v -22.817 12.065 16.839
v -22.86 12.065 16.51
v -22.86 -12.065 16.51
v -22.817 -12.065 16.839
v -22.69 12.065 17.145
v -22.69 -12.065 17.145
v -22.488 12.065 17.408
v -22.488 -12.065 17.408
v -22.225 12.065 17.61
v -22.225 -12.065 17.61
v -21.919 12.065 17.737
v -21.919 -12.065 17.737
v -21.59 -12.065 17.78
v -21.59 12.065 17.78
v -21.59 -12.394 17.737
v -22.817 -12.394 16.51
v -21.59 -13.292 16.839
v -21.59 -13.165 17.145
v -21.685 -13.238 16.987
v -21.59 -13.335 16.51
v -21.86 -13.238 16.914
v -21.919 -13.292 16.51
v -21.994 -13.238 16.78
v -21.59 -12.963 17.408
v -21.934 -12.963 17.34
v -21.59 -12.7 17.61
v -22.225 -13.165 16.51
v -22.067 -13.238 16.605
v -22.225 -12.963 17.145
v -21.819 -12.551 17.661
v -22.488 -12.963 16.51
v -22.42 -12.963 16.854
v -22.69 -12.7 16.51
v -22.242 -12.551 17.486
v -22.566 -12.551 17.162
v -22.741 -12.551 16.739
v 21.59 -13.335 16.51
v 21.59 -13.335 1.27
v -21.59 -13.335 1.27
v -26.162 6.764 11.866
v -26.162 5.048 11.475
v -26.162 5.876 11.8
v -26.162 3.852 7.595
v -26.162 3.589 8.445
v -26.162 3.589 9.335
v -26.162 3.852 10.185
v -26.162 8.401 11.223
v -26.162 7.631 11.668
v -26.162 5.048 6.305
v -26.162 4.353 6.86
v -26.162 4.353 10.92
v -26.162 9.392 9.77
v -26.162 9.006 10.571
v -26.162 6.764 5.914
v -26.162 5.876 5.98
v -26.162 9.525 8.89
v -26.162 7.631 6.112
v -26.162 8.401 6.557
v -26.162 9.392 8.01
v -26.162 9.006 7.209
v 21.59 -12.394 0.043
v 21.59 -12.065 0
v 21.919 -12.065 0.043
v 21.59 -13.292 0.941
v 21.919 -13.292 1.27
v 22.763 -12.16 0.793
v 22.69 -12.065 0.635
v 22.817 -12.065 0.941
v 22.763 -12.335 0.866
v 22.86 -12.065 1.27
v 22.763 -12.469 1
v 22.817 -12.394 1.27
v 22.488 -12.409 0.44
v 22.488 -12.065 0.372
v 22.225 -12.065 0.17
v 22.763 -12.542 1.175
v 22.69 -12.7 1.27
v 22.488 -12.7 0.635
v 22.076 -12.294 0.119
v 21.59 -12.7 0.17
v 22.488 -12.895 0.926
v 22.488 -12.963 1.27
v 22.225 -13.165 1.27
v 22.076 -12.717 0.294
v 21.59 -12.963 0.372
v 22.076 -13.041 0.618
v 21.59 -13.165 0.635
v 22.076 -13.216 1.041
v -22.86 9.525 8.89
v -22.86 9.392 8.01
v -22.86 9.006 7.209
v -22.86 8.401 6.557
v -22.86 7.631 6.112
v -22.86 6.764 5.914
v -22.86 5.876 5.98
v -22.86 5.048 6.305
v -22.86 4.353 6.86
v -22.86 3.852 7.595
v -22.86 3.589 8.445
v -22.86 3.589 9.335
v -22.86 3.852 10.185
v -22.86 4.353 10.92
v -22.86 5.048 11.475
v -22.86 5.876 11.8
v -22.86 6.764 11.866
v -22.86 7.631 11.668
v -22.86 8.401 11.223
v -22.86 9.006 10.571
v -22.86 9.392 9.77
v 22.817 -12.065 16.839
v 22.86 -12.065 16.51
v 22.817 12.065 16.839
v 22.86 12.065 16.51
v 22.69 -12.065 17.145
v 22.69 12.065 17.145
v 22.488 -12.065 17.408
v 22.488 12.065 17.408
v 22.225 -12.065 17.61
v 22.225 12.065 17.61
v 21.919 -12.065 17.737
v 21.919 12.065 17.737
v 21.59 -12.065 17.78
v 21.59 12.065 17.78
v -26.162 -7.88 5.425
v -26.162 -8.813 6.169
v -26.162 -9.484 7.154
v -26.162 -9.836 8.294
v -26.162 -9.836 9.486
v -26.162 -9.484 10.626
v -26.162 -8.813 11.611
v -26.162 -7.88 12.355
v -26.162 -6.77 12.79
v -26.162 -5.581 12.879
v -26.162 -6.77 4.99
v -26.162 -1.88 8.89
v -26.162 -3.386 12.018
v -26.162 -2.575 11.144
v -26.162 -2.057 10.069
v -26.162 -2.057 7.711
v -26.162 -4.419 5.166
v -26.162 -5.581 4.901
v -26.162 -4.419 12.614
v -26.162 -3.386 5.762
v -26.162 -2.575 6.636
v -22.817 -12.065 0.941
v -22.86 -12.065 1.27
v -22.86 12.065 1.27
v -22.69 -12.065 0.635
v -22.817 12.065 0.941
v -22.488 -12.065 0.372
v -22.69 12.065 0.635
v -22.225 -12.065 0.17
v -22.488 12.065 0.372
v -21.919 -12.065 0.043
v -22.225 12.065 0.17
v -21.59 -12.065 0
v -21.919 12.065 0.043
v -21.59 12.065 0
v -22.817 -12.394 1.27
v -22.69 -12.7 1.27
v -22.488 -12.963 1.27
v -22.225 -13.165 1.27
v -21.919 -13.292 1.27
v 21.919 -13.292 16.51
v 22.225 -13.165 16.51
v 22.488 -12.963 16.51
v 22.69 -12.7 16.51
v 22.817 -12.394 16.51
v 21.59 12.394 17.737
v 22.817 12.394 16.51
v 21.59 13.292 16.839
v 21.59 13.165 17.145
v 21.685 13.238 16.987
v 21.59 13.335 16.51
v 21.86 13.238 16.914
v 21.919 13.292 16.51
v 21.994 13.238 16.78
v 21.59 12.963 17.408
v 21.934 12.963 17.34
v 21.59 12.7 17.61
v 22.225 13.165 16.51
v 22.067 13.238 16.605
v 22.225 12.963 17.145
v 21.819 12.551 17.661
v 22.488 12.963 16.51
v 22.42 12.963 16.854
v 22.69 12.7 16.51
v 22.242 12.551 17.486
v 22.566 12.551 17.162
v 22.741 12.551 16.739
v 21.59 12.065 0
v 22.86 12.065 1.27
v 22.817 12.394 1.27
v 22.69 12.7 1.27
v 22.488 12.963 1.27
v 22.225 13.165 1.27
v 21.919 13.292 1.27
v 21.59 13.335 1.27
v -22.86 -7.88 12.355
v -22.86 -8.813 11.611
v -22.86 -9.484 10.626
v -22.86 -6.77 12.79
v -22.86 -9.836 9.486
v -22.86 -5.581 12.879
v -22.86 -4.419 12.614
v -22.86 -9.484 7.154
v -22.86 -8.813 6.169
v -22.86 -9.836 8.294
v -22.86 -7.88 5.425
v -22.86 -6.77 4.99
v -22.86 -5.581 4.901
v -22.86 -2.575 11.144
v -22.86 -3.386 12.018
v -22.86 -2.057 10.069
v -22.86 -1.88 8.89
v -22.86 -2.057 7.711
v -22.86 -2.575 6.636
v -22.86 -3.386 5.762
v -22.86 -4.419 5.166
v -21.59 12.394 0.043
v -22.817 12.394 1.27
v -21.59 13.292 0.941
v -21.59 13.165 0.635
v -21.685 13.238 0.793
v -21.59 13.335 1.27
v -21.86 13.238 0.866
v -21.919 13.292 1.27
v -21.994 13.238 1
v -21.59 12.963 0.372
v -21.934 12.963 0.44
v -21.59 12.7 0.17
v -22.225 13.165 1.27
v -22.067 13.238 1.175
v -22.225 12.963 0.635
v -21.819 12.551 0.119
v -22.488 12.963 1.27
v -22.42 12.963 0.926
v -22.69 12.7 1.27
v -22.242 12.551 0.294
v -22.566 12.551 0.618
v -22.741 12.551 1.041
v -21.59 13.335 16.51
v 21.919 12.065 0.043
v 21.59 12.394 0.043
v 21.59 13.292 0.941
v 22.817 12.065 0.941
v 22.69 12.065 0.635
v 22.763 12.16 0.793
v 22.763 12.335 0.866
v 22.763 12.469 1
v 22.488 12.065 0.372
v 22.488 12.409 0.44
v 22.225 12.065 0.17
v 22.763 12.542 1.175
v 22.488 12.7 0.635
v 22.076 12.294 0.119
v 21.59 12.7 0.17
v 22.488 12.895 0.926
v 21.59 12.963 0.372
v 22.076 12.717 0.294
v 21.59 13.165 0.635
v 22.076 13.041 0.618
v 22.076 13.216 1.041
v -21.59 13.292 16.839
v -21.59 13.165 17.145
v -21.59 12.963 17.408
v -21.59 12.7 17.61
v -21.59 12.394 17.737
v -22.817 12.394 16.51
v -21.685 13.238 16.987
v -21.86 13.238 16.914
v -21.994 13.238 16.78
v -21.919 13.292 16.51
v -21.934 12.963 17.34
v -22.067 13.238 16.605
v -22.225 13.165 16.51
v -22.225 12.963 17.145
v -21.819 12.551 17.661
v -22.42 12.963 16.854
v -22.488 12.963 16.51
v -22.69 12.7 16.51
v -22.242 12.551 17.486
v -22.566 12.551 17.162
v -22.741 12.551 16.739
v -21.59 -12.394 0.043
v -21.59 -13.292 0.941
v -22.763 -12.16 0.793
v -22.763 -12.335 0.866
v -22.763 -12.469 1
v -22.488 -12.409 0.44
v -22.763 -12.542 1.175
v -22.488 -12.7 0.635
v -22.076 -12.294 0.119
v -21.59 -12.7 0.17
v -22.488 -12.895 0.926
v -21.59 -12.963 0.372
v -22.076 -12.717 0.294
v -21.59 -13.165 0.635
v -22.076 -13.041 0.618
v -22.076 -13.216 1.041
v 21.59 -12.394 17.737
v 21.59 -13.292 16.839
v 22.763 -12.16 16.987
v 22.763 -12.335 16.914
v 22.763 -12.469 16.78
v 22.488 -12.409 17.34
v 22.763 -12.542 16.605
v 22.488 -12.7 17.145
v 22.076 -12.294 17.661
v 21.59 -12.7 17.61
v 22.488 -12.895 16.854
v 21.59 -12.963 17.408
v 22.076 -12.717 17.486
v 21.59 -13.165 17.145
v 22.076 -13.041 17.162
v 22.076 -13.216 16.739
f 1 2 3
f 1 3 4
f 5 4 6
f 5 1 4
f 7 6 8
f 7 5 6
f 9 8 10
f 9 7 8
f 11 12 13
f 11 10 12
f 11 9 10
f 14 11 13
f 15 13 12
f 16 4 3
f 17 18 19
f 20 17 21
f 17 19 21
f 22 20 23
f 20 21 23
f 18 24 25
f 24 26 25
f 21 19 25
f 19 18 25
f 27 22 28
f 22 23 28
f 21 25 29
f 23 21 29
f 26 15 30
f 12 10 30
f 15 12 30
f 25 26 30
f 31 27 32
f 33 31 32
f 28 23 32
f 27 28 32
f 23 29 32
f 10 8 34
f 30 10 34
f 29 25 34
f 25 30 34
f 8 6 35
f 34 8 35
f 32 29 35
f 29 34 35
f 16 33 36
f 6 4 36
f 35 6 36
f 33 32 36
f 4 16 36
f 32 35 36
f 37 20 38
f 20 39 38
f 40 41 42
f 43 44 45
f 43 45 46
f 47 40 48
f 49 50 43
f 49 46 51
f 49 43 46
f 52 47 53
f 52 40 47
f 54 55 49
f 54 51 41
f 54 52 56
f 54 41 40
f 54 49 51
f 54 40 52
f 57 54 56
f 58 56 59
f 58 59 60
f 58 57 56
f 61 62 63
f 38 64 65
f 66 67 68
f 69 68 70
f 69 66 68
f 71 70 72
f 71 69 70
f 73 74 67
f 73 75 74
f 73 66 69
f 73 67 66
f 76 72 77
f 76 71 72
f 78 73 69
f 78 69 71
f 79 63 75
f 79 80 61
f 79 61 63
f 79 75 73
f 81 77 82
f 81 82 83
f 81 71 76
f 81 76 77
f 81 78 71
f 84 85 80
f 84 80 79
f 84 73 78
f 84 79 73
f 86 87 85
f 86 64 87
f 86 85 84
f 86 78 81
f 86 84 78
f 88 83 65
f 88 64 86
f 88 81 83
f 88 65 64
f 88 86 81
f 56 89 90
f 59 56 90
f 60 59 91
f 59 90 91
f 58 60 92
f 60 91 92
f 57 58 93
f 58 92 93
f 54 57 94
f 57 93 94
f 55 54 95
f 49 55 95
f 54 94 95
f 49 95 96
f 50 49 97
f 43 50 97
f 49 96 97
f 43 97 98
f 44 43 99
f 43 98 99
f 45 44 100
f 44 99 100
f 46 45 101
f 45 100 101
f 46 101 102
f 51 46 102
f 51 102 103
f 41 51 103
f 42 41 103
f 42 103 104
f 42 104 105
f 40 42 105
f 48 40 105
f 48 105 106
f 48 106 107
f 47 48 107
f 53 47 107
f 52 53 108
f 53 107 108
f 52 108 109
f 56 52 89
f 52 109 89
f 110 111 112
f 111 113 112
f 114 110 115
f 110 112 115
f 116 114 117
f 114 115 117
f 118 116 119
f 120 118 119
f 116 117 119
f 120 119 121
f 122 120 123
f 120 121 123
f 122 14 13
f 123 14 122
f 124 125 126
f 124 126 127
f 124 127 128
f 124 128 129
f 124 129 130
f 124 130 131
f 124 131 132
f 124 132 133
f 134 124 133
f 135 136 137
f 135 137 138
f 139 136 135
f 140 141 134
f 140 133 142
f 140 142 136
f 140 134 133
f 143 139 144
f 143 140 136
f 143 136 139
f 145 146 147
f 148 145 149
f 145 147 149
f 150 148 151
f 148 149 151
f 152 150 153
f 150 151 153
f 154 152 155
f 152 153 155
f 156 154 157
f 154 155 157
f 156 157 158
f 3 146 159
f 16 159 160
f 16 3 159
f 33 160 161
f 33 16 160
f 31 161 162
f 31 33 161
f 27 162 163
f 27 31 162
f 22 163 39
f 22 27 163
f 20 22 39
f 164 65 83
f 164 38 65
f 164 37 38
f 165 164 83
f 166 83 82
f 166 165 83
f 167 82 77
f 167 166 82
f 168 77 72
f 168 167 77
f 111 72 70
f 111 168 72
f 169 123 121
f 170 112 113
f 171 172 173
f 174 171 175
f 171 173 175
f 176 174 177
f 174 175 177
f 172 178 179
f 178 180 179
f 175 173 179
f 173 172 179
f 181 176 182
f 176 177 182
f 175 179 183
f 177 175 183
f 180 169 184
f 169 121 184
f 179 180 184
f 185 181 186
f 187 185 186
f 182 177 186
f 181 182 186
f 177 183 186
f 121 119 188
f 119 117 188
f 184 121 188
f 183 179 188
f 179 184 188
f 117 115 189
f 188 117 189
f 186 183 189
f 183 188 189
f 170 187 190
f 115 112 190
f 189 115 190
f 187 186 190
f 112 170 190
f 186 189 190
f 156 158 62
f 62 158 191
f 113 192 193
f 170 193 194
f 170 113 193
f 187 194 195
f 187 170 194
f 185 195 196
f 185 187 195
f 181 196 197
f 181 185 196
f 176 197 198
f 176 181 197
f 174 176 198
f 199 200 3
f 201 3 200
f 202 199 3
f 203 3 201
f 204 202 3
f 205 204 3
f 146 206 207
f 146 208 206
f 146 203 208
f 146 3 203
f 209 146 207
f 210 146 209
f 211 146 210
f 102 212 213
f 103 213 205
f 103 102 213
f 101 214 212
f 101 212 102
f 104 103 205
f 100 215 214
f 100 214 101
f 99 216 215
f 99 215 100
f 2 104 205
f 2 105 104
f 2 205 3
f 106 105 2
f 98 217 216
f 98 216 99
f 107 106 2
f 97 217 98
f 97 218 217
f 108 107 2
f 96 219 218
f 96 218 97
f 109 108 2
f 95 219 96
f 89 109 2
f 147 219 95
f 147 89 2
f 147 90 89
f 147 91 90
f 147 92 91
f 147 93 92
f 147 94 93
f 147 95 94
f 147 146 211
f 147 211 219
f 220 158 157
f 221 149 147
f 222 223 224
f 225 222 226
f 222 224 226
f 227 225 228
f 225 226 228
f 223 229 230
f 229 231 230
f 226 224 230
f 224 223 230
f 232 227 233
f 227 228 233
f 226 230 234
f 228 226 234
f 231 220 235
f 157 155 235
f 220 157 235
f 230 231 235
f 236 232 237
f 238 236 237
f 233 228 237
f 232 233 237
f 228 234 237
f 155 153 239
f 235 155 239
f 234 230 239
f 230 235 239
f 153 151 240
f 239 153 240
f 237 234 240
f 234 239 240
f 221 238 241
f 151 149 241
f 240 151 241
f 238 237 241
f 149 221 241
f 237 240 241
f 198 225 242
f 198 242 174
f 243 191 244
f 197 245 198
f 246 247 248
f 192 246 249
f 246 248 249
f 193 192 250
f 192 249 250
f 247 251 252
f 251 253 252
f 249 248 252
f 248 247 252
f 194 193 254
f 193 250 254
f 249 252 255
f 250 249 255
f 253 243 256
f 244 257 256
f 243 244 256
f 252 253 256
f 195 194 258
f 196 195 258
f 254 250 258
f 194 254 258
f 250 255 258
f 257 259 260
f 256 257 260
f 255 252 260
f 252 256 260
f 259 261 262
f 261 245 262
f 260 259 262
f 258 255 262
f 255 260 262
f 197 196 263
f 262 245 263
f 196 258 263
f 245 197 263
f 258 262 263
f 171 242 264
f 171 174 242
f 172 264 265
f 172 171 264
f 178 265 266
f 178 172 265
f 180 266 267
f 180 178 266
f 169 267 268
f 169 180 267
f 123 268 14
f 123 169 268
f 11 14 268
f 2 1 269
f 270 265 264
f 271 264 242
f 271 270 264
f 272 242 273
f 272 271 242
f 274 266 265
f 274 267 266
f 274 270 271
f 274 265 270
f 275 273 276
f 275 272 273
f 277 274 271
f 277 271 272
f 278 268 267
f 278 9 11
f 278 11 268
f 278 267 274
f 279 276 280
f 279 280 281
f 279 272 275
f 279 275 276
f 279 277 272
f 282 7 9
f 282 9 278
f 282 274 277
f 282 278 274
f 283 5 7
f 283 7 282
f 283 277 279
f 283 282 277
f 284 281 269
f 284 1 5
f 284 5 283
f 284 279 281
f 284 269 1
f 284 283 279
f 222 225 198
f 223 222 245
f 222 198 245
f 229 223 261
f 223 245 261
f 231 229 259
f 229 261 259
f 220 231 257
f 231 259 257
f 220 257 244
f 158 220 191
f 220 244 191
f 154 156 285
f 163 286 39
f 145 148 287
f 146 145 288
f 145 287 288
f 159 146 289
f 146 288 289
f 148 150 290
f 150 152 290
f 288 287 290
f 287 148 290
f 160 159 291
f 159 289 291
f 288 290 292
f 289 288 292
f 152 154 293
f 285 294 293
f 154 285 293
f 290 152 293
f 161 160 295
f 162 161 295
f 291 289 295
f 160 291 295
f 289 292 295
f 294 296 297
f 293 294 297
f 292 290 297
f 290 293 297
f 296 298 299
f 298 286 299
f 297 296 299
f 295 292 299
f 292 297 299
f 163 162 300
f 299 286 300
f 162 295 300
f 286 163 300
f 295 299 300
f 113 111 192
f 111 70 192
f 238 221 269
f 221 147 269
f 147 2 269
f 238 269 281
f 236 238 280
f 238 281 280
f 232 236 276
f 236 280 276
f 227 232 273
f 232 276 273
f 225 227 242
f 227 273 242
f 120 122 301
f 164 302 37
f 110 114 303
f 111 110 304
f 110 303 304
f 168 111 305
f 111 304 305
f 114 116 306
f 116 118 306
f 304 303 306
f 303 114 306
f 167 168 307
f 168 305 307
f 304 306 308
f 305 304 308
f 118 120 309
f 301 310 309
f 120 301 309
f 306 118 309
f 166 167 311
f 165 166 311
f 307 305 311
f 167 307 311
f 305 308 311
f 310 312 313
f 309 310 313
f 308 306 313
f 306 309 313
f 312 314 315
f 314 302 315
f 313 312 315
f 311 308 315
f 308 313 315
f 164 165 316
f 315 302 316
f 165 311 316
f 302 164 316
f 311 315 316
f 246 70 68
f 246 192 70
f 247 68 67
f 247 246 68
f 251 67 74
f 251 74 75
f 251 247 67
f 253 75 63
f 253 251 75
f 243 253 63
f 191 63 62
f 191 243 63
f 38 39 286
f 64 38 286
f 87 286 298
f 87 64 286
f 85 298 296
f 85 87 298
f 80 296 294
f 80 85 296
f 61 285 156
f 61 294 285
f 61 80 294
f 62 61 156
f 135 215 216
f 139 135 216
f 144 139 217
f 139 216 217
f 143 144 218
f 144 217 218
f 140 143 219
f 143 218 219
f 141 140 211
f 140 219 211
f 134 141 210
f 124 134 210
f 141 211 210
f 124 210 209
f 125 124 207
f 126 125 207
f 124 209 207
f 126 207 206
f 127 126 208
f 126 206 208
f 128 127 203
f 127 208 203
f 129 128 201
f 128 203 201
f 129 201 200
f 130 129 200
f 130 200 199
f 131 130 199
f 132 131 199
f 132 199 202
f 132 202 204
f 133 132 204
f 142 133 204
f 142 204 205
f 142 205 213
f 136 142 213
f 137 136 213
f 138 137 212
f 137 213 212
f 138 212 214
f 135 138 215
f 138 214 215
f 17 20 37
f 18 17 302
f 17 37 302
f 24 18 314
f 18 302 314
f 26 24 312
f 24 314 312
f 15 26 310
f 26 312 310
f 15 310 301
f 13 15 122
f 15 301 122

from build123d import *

# Parameters (mm, degrees)
SKETCH1_W           = 45.72
SKETCH1_H           = 26.67
BOSS_EXTRUDE1_DEPTH = 17.78
FILLET1_R           = 1.27
SKETCH2_R           = 2.9845
SKETCH2_R_2         = 4.0005
BOSS_EXTRUDE2_DEPTH = 3.302


with BuildPart() as part:
    # Sketch1 → Boss-Extrude1 (new body)
    with BuildSketch(Plane.XY):
        Rectangle(SKETCH1_W, SKETCH1_H)
    extrude(amount=BOSS_EXTRUDE1_DEPTH)

    # Fillet1
    fillet1_edges = [part.edges().sort_by_distance(p)[0] for p in [
        (-22.86, 0, 17.78),
        (0, -13.335, 17.78),
        (22.86, 0, 17.78),
        (0, -13.335, 0),
        (-22.86, 0, 0),
        (0, 13.335, 0),
        (22.86, 0, 0),
        (0, 13.335, 17.78),
        (22.86, -13.335, 8.89),
        (-22.86, -13.335, 8.89),
        (-22.86, 13.335, 8.89),
        (22.86, 13.335, 8.89),
    ]]
    fillet(fillet1_edges, radius=FILLET1_R)

    # Sketch2 → Boss-Extrude2 (add)
    with BuildSketch(Plane.ZY.offset(22.86)):
        with Locations(Location((8.89, 6.5405, 0), (0, 0, 90))):
            Circle(SKETCH2_R)
        with Locations(Location((8.89, -5.8801, 0), (0, 0, 90))):
            Circle(SKETCH2_R_2)
    extrude(amount=BOSS_EXTRUDE2_DEPTH)


solid = part.part
